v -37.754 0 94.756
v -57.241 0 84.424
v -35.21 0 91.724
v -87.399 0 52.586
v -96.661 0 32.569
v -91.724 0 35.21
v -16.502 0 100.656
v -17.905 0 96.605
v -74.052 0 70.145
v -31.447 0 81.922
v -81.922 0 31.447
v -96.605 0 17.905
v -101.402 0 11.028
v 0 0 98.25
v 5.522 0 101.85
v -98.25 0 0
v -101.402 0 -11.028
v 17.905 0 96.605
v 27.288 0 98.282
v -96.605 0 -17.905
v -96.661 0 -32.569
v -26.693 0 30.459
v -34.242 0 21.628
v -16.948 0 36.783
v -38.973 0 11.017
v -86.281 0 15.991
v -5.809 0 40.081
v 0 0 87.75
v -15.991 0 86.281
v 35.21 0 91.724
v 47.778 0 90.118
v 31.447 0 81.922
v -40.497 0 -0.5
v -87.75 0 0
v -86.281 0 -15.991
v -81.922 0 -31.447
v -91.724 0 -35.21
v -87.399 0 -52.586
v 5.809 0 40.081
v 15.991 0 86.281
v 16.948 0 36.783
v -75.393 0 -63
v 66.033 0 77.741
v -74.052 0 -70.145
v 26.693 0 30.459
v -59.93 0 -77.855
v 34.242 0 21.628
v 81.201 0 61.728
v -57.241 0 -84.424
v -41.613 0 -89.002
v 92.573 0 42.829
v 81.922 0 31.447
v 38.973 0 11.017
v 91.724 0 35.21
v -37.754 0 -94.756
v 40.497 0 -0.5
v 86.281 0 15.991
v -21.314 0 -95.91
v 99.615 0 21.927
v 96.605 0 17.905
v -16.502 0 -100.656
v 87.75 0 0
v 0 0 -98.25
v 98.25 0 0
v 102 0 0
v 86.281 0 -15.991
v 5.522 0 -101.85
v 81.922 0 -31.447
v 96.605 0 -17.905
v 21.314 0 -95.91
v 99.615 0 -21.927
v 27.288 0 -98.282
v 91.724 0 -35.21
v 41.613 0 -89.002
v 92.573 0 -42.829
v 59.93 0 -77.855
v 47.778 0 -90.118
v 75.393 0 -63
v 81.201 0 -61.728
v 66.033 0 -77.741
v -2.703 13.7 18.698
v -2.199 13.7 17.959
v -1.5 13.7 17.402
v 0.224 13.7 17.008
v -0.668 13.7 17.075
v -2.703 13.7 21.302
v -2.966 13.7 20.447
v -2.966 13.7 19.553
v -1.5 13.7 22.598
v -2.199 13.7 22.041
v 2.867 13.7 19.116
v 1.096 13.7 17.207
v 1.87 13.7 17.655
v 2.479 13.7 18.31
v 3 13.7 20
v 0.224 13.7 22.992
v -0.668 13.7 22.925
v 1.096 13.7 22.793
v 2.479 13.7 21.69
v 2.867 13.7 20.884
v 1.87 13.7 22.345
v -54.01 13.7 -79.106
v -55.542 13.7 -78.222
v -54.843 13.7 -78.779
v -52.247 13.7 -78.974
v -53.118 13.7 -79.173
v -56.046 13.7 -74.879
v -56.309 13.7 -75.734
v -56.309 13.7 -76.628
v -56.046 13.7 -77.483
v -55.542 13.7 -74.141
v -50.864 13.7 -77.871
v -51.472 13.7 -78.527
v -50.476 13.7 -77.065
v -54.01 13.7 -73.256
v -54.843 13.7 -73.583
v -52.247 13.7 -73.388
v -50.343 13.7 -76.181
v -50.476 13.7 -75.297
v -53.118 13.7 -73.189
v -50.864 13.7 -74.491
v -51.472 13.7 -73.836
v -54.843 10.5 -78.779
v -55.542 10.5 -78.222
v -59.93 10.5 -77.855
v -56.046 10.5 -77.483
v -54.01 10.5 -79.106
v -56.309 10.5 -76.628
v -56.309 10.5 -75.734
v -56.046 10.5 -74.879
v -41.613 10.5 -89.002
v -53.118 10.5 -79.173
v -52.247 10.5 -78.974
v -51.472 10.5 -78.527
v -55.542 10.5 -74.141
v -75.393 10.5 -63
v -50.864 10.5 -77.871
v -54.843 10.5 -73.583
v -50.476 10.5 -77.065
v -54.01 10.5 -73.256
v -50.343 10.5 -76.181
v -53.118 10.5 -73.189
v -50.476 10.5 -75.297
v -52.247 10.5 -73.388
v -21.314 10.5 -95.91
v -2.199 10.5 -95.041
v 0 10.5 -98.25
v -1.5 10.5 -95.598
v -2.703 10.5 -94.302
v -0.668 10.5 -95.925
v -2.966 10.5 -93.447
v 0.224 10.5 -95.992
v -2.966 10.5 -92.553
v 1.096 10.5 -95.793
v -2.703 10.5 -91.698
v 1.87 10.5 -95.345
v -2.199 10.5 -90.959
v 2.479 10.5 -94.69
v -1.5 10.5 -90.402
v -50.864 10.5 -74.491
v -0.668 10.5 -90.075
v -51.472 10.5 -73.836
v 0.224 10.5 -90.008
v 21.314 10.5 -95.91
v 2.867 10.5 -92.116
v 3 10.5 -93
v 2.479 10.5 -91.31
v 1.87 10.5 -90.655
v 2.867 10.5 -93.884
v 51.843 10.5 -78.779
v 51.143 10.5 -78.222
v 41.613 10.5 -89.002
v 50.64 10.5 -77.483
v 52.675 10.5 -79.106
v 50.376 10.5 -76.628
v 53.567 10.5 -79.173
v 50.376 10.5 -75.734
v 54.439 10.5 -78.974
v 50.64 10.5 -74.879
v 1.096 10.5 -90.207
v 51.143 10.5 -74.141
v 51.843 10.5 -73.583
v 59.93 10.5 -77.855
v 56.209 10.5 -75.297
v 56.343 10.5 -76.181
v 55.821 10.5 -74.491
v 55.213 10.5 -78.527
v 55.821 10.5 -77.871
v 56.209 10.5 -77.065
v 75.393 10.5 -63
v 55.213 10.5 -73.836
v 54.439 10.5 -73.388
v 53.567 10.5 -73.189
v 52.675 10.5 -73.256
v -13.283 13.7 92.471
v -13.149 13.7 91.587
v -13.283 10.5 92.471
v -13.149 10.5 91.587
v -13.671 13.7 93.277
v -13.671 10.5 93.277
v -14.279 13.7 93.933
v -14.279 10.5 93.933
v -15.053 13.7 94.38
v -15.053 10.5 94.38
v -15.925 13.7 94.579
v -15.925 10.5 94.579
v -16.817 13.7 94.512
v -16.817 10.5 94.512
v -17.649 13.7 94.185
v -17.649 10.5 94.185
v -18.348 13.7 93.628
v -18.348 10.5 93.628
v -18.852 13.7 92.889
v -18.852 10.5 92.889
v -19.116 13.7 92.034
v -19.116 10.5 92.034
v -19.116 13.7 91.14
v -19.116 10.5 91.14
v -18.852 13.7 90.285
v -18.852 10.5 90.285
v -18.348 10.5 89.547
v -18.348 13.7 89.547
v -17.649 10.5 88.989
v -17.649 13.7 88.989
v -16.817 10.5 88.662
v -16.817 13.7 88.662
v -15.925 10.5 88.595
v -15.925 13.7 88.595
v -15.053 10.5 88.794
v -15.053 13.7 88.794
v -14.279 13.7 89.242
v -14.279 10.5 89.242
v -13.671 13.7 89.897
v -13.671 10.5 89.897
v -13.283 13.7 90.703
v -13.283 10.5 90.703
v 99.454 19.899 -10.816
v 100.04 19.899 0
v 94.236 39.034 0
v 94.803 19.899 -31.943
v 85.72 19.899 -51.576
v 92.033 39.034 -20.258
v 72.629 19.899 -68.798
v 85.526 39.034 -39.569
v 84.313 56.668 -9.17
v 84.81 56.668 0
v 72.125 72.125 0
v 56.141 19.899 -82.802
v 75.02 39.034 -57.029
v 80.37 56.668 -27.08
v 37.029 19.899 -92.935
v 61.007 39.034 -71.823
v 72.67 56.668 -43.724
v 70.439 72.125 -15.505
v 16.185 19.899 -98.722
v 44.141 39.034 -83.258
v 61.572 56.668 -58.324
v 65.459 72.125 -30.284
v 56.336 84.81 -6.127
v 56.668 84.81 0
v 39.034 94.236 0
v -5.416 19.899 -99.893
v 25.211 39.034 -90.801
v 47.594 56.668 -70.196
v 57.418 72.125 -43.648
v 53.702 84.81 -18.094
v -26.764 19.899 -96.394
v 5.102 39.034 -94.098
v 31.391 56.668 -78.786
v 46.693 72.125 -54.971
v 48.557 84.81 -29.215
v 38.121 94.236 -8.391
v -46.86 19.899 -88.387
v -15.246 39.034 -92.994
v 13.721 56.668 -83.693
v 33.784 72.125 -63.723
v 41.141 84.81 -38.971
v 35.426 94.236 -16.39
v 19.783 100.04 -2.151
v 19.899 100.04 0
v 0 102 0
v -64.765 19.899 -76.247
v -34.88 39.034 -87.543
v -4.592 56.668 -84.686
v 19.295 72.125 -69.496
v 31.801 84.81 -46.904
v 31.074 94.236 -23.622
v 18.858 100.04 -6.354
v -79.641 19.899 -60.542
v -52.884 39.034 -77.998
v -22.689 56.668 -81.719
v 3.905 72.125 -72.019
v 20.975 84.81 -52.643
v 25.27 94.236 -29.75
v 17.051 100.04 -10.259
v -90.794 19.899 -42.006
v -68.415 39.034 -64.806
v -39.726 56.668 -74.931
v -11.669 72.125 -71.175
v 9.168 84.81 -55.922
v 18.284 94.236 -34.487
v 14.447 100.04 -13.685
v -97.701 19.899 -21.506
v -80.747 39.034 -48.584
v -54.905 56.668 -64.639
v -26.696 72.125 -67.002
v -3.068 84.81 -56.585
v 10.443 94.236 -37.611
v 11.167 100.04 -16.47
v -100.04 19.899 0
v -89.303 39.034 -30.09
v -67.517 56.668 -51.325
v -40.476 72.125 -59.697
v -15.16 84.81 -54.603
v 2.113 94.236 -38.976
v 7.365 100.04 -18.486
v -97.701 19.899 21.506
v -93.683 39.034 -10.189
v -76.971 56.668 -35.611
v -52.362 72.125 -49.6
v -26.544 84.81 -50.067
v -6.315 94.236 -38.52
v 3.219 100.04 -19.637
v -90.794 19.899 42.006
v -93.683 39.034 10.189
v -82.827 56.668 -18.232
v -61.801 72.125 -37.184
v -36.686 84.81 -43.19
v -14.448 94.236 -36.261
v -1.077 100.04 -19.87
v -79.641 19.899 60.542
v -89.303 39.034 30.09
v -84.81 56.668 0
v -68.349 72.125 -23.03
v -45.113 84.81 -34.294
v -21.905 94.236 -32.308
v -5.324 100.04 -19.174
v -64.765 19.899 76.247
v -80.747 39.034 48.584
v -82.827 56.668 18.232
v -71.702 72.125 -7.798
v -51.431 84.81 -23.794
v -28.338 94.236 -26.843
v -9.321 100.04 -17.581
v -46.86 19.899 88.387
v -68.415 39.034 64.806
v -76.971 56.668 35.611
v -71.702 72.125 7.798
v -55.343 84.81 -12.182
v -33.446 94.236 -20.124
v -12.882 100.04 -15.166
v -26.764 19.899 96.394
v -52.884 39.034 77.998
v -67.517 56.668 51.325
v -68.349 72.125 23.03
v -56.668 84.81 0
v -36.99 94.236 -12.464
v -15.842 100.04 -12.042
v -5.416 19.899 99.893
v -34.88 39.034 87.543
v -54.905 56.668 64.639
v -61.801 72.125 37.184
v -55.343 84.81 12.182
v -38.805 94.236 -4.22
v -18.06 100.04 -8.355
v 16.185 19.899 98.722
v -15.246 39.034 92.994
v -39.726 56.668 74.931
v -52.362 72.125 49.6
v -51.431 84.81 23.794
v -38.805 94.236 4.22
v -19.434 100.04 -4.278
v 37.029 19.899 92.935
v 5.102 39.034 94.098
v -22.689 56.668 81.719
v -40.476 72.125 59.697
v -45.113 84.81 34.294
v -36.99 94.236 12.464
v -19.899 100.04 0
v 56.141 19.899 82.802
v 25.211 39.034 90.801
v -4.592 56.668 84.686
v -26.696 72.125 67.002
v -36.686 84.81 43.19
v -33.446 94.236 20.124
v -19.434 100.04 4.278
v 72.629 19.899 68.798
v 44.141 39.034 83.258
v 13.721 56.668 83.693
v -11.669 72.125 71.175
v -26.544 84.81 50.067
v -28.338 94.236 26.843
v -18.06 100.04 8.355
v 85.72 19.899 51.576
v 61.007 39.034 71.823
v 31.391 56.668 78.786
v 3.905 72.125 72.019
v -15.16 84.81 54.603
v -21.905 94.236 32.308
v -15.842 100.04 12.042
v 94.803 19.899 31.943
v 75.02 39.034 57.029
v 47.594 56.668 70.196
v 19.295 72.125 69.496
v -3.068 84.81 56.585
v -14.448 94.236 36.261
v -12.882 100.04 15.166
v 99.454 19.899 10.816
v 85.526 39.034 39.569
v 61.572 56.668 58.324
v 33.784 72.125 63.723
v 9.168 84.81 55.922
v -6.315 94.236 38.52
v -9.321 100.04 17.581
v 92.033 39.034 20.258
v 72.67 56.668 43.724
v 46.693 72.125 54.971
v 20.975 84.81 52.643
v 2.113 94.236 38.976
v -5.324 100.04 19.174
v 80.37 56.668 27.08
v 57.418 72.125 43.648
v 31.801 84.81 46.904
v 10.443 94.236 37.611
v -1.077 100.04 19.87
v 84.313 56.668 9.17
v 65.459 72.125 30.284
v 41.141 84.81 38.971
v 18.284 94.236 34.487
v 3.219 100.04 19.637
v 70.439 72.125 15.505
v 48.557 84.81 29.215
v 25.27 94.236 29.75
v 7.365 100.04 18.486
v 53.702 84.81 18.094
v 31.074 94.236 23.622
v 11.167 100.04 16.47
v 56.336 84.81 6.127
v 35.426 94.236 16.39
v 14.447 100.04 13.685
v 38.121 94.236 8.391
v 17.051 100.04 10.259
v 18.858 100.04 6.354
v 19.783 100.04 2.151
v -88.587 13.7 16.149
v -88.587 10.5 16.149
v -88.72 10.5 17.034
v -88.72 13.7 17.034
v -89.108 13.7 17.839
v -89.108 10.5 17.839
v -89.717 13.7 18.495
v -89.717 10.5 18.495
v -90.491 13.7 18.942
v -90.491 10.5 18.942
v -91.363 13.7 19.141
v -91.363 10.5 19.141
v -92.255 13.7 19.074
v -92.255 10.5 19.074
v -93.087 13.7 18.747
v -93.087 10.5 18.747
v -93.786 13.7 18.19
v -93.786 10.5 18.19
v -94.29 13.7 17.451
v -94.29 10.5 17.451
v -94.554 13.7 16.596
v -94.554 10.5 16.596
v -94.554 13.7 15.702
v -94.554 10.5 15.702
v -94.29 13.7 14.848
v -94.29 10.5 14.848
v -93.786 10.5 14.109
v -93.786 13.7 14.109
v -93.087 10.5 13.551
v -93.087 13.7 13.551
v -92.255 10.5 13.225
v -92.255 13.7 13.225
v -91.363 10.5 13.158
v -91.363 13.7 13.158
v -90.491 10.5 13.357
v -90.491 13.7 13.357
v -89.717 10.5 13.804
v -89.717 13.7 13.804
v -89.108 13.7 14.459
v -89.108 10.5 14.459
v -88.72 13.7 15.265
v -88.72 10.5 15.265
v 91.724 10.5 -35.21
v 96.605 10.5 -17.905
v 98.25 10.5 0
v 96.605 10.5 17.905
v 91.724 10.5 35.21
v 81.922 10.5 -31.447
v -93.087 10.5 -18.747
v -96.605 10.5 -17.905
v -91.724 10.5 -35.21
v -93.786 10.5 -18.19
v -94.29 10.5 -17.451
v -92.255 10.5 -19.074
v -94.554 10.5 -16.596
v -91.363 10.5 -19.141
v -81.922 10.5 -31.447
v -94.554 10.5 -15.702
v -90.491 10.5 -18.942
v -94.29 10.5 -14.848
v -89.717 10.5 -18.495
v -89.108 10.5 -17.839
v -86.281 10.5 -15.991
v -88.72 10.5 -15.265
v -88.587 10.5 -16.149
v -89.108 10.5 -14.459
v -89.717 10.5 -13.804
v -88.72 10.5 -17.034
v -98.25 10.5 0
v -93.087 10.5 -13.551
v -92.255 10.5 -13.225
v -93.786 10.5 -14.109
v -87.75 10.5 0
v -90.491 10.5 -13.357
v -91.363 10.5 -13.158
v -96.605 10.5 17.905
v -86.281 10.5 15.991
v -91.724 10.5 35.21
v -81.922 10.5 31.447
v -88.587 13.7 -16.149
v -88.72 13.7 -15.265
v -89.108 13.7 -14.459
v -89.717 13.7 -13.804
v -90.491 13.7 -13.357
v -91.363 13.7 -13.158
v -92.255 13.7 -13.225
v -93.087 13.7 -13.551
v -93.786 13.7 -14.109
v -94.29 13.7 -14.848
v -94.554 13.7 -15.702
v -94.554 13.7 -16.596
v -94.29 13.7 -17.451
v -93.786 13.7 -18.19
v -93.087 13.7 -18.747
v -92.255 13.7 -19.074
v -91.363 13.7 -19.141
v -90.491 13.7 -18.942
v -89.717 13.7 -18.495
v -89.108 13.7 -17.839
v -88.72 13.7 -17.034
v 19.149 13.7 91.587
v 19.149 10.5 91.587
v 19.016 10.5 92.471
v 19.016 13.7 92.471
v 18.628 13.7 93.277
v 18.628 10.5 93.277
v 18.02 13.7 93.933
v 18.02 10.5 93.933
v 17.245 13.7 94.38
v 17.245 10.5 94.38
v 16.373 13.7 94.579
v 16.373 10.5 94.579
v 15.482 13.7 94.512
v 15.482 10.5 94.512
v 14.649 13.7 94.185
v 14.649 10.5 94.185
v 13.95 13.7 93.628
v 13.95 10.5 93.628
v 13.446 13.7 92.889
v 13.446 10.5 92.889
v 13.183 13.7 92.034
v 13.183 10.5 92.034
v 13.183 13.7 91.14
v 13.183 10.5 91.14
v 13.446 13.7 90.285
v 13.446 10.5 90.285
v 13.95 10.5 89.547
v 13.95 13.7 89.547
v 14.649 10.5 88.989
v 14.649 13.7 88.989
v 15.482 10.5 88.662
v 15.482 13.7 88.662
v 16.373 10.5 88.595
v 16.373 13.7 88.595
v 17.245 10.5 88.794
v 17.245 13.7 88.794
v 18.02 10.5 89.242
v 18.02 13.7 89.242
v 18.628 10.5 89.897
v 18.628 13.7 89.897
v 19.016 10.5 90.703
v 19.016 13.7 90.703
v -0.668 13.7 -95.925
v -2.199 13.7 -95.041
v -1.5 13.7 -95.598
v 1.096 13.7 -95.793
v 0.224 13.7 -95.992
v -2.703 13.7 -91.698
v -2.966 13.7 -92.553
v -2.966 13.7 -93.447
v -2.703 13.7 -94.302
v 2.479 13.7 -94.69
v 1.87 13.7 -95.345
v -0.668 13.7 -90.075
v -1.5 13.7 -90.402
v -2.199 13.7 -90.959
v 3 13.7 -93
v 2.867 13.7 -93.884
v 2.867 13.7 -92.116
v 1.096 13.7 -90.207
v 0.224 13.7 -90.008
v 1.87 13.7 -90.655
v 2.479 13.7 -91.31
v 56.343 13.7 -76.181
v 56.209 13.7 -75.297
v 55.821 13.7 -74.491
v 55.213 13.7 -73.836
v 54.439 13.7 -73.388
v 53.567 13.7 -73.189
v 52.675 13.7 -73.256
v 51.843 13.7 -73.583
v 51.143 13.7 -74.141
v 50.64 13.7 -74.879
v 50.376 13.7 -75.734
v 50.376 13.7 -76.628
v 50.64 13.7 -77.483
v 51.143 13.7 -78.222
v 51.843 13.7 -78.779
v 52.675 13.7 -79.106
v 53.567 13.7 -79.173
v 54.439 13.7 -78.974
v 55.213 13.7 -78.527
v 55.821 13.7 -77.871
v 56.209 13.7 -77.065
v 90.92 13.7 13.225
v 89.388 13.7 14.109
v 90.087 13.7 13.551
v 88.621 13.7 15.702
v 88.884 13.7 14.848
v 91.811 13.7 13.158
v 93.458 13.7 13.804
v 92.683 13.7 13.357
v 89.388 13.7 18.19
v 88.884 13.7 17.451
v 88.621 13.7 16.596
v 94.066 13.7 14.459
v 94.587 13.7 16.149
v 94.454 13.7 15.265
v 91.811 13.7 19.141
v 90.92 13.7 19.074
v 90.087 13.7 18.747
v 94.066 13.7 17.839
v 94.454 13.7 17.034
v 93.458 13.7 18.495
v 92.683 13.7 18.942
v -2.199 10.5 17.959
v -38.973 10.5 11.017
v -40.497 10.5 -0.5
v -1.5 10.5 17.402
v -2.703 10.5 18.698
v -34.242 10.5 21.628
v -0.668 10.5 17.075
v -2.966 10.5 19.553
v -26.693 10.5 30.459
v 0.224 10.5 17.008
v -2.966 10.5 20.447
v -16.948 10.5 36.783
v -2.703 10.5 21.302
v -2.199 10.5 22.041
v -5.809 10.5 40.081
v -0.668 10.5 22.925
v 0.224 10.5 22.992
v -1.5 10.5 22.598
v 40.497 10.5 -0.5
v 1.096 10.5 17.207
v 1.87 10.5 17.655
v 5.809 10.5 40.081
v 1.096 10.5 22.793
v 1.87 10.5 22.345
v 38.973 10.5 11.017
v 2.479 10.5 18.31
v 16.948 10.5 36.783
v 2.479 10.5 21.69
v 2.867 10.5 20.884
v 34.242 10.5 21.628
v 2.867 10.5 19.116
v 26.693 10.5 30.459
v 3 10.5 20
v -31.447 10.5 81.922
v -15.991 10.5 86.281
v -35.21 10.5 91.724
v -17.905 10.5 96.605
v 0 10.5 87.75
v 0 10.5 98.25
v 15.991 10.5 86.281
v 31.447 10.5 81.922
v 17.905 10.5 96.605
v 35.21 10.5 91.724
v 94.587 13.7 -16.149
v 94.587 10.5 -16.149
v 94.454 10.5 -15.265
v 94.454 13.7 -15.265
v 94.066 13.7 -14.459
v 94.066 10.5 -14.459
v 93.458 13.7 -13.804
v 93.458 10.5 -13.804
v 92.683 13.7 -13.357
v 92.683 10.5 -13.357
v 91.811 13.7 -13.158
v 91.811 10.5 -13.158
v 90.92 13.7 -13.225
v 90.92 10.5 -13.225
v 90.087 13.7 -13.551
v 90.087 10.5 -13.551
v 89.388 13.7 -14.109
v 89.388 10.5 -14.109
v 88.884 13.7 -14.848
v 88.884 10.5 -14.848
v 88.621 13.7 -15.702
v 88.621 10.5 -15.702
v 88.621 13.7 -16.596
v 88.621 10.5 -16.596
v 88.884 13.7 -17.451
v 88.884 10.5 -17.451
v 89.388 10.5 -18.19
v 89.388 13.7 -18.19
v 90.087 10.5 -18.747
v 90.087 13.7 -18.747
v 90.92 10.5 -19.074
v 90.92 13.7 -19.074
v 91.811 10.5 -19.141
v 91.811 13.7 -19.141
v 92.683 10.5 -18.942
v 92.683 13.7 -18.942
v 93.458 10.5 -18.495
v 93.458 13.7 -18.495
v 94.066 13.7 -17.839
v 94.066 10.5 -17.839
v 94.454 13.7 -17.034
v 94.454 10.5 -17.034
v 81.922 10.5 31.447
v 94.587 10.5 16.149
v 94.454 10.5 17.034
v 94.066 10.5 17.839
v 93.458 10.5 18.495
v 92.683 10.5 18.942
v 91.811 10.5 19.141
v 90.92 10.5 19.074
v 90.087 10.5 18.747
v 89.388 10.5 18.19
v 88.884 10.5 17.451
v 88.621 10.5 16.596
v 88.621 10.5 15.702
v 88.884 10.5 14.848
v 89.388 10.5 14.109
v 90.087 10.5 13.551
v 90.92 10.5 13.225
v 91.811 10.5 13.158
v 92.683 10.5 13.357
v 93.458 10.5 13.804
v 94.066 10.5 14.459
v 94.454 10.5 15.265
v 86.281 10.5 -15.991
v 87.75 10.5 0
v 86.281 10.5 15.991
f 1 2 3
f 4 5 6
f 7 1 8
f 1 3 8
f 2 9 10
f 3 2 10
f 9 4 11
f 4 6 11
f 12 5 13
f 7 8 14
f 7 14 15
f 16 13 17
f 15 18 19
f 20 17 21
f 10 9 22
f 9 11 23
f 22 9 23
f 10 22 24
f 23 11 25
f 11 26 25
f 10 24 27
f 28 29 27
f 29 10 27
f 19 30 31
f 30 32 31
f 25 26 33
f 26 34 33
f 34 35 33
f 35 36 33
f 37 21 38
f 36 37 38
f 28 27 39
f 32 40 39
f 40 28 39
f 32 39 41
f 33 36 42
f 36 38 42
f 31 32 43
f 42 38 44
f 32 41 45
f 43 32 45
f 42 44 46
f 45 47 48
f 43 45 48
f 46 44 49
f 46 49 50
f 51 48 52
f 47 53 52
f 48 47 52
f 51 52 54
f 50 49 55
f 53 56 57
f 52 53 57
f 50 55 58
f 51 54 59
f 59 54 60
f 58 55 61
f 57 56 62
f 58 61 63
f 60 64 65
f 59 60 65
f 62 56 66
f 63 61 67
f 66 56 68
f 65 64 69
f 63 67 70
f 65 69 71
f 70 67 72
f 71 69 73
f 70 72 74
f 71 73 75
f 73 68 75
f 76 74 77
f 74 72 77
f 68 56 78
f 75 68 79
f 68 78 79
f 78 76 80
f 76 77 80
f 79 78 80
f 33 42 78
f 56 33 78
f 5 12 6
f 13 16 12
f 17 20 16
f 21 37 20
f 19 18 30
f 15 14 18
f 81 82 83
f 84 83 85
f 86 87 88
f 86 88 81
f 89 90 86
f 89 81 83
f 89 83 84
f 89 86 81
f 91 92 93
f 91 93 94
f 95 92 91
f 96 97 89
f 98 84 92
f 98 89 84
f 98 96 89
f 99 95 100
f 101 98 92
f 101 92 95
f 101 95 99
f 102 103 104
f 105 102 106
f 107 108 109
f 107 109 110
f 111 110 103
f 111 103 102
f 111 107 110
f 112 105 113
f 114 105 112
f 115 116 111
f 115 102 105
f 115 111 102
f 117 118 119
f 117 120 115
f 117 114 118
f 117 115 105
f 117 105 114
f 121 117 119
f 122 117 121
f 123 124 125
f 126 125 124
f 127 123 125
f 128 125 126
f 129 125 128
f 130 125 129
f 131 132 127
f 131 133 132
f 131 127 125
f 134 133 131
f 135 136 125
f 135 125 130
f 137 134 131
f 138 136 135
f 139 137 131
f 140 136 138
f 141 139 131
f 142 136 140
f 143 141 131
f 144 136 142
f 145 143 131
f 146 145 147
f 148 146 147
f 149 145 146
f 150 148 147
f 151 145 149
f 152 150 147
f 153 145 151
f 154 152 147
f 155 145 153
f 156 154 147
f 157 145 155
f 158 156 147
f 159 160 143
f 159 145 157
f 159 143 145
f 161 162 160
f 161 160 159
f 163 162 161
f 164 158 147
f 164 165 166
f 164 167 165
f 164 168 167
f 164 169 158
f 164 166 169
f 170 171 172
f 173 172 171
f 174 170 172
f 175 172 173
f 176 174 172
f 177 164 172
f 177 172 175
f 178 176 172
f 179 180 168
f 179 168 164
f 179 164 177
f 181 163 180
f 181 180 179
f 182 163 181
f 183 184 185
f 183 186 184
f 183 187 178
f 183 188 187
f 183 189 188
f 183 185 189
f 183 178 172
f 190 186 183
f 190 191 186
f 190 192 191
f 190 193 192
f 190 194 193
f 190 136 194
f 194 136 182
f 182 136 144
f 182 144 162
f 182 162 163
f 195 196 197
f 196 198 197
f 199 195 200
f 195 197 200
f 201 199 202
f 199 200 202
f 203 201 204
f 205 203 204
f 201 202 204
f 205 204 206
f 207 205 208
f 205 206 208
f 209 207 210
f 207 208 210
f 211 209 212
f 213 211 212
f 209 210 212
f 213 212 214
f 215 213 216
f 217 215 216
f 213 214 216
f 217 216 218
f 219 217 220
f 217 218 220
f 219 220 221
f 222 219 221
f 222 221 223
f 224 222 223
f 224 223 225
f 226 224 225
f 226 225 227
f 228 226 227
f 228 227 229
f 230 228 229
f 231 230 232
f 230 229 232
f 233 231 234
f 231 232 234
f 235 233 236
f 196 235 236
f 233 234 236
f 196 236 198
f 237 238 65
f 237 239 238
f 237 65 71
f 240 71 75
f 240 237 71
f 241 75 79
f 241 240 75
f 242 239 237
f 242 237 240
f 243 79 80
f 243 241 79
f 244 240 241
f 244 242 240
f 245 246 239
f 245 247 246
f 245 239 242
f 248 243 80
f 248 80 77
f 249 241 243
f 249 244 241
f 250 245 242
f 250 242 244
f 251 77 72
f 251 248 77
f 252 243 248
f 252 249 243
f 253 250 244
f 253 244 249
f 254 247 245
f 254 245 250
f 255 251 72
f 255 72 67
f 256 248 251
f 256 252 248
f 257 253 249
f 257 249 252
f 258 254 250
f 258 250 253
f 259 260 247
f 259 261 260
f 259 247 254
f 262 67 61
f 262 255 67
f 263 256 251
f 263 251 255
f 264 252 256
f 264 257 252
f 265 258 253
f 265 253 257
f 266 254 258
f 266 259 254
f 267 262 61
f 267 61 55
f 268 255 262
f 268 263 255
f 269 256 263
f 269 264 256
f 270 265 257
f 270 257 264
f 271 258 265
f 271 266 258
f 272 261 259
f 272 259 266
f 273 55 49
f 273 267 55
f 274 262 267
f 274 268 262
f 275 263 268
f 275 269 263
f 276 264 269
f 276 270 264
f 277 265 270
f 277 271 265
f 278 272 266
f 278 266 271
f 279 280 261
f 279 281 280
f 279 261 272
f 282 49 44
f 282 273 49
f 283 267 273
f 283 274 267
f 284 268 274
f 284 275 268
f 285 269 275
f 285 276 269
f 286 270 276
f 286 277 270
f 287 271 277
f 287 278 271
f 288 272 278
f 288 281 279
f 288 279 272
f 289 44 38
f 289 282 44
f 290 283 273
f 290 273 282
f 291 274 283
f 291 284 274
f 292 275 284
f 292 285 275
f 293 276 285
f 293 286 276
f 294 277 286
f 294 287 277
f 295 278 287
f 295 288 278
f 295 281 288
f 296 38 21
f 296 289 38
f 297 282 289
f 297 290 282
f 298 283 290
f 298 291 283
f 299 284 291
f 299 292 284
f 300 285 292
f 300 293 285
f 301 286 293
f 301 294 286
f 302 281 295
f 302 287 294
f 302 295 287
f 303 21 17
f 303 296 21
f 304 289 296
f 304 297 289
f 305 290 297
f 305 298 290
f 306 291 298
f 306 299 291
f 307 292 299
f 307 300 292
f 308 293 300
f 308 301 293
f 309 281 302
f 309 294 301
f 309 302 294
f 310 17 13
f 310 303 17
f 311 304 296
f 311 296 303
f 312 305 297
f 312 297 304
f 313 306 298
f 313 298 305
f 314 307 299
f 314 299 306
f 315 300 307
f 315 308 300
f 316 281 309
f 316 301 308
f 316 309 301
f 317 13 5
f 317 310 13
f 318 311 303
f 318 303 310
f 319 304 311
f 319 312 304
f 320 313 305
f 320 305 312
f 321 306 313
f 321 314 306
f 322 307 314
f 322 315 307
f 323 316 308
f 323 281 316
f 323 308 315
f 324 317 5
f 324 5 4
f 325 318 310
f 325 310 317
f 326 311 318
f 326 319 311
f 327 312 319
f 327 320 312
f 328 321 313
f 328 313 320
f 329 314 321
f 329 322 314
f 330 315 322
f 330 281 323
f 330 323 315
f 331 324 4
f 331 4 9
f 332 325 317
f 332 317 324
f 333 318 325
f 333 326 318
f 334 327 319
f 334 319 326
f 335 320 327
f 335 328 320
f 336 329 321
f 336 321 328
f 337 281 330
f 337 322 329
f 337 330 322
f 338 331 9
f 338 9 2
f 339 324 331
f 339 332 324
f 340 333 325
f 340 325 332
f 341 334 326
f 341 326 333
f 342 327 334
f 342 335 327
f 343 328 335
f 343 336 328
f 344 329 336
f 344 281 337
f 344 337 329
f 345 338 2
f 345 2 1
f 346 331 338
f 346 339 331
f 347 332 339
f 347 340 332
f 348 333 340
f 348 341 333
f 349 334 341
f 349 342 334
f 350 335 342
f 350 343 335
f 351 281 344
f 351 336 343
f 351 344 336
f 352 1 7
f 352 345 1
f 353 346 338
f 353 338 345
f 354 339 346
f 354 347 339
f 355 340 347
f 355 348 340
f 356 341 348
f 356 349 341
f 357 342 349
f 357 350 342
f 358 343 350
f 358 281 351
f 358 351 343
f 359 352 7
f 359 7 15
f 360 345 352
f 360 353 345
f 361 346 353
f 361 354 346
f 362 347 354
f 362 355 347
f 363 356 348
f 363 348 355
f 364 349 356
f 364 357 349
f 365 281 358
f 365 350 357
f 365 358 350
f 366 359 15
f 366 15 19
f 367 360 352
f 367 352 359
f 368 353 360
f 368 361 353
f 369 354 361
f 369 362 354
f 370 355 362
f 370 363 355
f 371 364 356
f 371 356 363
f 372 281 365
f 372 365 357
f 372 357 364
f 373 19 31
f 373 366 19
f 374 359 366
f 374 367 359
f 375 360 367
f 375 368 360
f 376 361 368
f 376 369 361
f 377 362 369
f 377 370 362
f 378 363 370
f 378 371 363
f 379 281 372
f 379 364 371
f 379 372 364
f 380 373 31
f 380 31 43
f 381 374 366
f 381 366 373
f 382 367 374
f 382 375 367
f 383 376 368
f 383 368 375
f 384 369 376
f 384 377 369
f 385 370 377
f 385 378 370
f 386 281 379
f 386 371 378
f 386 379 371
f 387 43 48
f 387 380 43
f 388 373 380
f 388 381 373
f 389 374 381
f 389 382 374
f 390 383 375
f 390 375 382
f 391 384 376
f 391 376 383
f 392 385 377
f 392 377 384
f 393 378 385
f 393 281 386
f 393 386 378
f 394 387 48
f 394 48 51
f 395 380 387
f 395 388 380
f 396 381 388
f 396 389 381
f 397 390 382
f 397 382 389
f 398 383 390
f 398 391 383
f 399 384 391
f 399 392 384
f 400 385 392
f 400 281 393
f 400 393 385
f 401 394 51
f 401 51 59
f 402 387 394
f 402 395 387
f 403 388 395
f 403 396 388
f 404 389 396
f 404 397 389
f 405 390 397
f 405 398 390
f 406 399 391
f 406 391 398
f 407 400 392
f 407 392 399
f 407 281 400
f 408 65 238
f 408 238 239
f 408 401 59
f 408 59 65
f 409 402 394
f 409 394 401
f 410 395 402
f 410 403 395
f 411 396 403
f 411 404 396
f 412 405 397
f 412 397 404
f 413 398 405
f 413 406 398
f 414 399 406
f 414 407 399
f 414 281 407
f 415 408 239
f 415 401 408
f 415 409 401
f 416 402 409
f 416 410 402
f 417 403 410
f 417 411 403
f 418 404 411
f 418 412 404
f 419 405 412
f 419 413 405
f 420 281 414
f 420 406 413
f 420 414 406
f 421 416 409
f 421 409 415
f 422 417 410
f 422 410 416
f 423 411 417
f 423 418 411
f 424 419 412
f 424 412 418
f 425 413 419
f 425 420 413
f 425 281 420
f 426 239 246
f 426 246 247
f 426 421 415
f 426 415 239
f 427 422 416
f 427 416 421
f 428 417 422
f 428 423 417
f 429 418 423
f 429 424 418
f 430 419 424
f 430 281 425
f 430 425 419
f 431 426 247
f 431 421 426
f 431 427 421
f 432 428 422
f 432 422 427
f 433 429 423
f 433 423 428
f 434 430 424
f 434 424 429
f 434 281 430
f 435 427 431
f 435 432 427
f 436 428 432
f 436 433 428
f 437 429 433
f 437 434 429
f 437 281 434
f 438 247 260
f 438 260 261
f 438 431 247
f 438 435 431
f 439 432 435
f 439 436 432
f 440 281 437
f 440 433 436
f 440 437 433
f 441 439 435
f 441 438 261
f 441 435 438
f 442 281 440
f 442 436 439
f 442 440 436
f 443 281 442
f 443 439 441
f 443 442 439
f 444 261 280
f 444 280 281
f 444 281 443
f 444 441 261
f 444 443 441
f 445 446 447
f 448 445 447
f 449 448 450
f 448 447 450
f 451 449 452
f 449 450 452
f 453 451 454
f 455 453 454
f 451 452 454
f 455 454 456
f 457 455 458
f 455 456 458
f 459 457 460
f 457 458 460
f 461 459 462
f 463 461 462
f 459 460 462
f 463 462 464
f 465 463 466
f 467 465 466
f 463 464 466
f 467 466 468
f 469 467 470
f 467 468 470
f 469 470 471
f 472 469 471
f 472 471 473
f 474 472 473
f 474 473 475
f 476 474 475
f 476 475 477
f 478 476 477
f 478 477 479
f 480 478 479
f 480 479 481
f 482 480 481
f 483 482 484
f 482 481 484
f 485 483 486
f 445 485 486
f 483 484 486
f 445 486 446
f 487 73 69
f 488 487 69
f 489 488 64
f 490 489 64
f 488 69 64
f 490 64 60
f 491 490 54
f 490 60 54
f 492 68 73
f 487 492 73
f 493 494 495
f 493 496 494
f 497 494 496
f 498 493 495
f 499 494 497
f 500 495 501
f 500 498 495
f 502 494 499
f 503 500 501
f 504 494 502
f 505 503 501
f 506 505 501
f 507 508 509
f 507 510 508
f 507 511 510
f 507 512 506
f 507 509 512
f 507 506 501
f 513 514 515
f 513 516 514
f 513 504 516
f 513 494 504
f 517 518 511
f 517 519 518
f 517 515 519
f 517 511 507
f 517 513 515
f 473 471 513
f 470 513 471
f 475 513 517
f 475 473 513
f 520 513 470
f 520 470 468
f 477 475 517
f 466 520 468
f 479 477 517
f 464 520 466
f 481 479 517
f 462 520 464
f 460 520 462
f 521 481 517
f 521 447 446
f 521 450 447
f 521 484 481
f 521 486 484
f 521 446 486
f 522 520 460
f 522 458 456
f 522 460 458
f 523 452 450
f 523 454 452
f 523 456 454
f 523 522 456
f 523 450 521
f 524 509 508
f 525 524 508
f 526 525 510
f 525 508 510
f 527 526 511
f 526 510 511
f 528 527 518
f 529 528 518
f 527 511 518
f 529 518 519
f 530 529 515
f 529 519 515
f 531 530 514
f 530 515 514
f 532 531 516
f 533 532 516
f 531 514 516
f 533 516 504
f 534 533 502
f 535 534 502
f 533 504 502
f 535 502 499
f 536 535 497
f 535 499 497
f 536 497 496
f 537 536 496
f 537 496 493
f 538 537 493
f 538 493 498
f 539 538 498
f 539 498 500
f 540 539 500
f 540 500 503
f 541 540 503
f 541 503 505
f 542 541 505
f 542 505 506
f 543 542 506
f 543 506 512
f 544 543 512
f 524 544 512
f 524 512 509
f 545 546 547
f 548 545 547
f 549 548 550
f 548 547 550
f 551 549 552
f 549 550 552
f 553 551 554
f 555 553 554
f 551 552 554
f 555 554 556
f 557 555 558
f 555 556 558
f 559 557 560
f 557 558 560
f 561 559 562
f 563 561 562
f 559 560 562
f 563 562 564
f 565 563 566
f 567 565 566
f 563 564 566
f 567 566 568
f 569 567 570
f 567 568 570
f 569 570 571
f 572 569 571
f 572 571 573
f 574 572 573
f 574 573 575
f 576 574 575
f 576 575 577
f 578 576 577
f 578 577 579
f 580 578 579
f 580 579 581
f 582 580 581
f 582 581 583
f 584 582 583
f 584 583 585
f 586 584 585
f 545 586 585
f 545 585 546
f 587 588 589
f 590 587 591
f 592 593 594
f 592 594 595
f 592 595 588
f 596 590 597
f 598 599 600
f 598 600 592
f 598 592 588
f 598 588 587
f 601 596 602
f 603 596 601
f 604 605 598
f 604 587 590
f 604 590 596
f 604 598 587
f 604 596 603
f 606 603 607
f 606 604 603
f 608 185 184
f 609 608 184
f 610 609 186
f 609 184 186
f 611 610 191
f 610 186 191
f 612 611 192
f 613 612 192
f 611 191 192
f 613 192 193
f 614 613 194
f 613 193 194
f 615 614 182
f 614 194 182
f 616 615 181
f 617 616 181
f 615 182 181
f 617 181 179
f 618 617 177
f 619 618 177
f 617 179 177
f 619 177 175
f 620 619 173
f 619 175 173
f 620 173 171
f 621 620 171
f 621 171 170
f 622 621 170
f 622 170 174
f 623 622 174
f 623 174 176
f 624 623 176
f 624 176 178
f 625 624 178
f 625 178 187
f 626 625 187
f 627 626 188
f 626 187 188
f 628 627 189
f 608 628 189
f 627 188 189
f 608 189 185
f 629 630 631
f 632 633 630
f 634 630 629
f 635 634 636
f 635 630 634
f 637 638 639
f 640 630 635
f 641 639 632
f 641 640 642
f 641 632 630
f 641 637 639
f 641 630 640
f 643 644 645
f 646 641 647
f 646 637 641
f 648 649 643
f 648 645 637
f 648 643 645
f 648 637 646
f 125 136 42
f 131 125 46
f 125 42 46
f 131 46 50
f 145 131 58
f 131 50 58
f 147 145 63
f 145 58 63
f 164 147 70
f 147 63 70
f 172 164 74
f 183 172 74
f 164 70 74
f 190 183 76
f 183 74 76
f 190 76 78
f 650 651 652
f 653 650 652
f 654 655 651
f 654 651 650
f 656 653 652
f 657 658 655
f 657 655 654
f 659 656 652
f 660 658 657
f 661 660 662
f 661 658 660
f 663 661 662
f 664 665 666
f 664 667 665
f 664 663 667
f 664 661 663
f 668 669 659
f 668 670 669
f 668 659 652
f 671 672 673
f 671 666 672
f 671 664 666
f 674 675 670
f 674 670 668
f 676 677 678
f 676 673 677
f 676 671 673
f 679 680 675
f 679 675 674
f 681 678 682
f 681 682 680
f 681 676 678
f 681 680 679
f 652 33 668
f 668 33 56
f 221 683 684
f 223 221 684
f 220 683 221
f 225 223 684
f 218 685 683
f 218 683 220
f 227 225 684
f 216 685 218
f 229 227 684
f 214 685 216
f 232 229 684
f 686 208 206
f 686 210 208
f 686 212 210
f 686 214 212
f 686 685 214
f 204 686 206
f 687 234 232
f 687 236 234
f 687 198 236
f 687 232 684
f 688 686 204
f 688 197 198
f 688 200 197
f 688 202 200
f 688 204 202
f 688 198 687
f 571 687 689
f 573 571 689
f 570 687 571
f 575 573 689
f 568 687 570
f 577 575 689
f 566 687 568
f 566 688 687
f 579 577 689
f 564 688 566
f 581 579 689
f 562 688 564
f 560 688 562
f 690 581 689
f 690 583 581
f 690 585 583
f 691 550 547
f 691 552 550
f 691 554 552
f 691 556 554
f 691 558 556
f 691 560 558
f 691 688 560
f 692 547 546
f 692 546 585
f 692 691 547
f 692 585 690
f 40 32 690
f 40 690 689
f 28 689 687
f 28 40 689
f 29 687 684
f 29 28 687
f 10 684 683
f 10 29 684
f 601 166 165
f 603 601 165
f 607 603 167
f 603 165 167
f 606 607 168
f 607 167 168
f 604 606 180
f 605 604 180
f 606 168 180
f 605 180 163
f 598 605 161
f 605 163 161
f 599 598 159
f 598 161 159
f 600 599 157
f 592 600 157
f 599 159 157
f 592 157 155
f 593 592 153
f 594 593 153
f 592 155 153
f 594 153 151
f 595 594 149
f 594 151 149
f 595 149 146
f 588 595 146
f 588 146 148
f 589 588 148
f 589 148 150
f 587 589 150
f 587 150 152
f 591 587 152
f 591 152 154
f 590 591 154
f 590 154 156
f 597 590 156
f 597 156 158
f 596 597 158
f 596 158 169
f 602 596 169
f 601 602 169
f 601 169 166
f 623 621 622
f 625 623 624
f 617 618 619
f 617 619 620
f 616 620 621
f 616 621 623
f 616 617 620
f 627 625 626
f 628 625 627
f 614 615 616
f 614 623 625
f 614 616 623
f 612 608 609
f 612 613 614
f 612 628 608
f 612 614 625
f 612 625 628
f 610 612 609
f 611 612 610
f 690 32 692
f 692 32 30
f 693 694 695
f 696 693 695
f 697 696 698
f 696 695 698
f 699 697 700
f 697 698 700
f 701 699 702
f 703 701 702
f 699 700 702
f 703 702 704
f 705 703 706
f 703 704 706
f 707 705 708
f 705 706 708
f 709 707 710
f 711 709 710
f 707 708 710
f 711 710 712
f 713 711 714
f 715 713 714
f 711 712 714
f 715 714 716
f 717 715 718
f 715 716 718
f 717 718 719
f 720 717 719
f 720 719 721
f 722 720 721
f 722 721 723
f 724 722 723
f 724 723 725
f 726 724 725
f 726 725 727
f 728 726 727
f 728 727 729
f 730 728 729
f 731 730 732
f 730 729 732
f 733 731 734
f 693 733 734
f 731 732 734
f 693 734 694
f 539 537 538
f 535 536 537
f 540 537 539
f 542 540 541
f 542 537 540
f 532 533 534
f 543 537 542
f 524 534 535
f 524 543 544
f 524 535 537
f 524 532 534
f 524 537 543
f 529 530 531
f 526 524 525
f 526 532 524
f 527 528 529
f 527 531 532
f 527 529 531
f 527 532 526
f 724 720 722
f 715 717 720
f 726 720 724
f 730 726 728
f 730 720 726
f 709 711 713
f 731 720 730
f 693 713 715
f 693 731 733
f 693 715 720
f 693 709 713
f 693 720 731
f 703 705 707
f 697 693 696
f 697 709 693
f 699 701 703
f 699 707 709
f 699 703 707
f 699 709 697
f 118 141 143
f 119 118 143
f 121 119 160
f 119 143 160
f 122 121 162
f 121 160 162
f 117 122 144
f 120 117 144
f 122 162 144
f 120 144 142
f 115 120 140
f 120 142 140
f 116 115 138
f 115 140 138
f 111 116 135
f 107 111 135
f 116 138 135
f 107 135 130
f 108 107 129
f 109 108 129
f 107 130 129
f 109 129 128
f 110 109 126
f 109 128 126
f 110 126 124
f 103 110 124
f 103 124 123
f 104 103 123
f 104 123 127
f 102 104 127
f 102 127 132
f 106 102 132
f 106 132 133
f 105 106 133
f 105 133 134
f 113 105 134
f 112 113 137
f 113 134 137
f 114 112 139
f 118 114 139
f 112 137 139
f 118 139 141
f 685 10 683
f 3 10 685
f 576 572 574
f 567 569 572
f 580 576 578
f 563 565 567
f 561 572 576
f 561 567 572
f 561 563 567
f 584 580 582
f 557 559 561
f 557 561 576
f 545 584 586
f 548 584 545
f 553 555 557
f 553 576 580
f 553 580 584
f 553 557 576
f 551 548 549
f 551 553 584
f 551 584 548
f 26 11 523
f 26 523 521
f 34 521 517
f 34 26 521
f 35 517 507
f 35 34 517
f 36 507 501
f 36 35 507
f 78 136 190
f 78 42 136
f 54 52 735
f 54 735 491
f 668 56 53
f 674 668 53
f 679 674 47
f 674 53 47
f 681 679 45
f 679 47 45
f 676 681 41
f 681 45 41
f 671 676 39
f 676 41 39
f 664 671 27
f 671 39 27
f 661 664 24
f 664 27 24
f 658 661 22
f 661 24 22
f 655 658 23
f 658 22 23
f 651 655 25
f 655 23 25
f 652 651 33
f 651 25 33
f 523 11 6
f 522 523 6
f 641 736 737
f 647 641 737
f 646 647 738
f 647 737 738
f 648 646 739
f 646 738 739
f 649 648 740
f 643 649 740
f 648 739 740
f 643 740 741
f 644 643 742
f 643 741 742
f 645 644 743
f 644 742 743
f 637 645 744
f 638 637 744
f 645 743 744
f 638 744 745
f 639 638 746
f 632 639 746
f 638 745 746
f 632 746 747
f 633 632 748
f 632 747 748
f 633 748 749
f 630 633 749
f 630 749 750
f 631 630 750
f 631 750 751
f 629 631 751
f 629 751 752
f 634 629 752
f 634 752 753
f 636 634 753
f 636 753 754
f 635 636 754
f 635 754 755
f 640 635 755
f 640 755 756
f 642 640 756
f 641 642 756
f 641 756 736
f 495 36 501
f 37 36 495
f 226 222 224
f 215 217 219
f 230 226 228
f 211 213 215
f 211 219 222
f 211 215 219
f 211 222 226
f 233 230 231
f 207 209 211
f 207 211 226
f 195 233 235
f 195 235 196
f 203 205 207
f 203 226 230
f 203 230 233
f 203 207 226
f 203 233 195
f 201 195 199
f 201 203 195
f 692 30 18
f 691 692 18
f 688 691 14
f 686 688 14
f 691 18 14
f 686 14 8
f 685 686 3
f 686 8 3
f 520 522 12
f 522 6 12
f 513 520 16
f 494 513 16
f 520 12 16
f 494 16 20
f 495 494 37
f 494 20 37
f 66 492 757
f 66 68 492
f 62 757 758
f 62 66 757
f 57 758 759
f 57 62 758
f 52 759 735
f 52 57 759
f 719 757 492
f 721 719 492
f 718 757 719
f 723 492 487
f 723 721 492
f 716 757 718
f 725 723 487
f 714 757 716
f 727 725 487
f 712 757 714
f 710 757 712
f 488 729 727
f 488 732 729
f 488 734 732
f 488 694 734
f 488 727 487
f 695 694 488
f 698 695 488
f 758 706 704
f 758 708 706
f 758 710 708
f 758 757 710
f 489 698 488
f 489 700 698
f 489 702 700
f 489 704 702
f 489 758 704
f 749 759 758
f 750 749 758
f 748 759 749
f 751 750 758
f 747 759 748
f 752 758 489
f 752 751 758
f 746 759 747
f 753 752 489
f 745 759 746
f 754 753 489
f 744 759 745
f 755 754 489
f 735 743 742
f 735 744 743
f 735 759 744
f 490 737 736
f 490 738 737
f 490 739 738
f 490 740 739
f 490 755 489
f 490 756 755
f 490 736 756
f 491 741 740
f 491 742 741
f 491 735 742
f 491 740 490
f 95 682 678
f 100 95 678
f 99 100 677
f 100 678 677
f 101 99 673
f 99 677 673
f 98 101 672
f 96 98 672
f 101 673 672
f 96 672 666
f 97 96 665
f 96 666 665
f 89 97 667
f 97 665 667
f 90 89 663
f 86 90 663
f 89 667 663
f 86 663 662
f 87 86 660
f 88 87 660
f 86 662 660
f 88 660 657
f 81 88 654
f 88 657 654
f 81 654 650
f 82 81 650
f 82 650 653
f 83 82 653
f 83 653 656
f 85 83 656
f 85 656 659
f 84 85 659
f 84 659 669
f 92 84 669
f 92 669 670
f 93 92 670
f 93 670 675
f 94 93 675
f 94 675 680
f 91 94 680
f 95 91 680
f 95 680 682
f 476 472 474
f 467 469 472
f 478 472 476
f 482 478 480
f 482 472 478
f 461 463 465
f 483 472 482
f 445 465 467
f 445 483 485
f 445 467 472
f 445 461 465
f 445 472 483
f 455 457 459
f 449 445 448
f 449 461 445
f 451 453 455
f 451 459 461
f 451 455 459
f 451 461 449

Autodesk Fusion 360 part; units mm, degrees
sketch "Sketch1" plane through (0, 0, 0) normal (0, 0, 1) x (1, 0, 0)
  line L0 (0, 0) -> (102, 0)
  line L1 (0, 0) -> (0, 102)
  arc A0 (102, 0) -> (0, 102) centre (0, 0) ccw
  dimension "d1" = 204
revolve "Revolve1" add sketch "Sketch1" angle 360 about axis through (0, 0, 0) along (0, 1, 0)
sketch "Sketch2" plane through (0, 0, 0) normal (0, -1, 0) x (1, 0, 0)
  circle A0 centre (0, 0) radius 102
  line L0 (0, 0) -> (0, -0.5) construction
  line L1 (0, -0.5) -> (-40.4969, -0.5) construction
  line L2 (-40.4969, -0.5) -> (40.4969, -0.5)
  arc A1 (40.4969, -0.5) -> (-40.4969, -0.5) centre (0, 0) ccw
  dimension "d3" = 81
  dimension "d4" = 0.5
extrude "Extrude1" cut sketch "Sketch2" against normal blind 10.5 contours L2 A1
sketch "Sketch3" plane through (0, 0, 0) normal (0, -1, 0) x (1, 0, 0)
  line L0 (40.4969, -0.5) -> (-40.4969, -0.5)
  arc A0 (40.4969, -0.5) -> (-40.4969, -0.5) centre (0, 0) ccw
  circle A1 centre (0, 0) radius 102
sketch "Sketch4" plane through (0, 0, 0) normal (0, -1, 0) x (1, 0, 0)
  line L0 (0, 0) -> (0, -64) construction
  line L1 (40, -64) -> (40, -63)
  line L2 (40, -46.5) -> (-40, -81.5) construction
  line L3 (-40, -46.5) -> (0, -64) construction
  line L4 (0, -64) -> (0, -63)
  line L5 (0, -63) -> (-61.0824, -63)
  line L6 (0, -63) -> (61.0824, -63)
  line L7 (-40, -63) -> (-40, -64)
  arc A0 (-36.3095, -79.8854) -> (-32.524, -81.5) centre (0, 0) ccw
  line L8 (31.4468, 81.9217) -> (35.2097, 91.7243)
  line L9 (0, 0) -> (98.25, 0) construction
  line L10 (-31.4468, 81.9217) -> (-35.2097, 91.7243)
  line L11 (0, 0) -> (98.25, 0) construction
  line L12 (81.9217, 31.4468) -> (91.7243, 35.2097)
  line L13 (0, 0) -> (98.25, 0) construction
  line L14 (81.9217, -31.4468) -> (91.7243, -35.2097)
  line L15 (0, 0) -> (98.25, 0) construction
  line L16 (0, 114.2451) -> (0, -120) construction
  line L17 (-81.9217, 31.4468) -> (-91.7243, 35.2097)
  line L18 (-81.9217, -31.4468) -> (-91.7243, -35.2097)
  arc A1 (-81.9217, 31.4468) -> (-81.9217, -31.4468) centre (0, 0) ccw
  arc A2 (81.9217, -31.4468) -> (81.9217, 31.4468) centre (0, 0) ccw
  arc A3 (31.4468, 81.9217) -> (-31.4468, 81.9217) centre (0, 0) ccw
  arc A4 (35.2097, 91.7243) -> (-35.2097, 91.7243) centre (0, 0) ccw
  line L19 (-61.0824, -63) -> (-75.3927, -63)
  line L20 (61.0824, -63) -> (75.3927, -63)
  arc A5 (-91.7243, 35.2097) -> (-91.7243, -35.2097) centre (0, 0) ccw
  arc A6 (-75.3927, -63) -> (75.3927, -63) centre (0, 0) ccw
  arc A7 (91.7243, -35.2097) -> (91.7243, 35.2097) centre (0, 0) ccw
  point P0 (0, -64)
  dimension "d9" = 196.5
  dimension "d10" = 175.5
  dimension "d11" = 64
  dimension "d13" = 35
  dimension "d14" = 1
  dimension "d15" = 69
  dimension "d16" = 111
  dimension "d17" = 21
  dimension "d18" = 21
extrude "Extrude2" cut sketch "Sketch4" against normal blind 10.5
sketch "Sketch5" plane through (0, 0, 0) normal (0, -1, 0) x (1, 0, 0)
  circle A0 centre (0, 0) radius 93 construction
  line L0 (0, 0) -> (-16.1493, 91.5871) construction
  line L1 (0, 0) -> (93, 0) construction
  line L2 (0, 0) -> (16.1493, 91.5871) construction
  line L3 (0, 0) -> (93, 0) construction
  line L4 (0, 0) -> (-91.5871, 16.1493) construction
  line L5 (0, 0) -> (93, 0) construction
  line L6 (0, 0) -> (-91.5871, -16.1493) construction
  line L7 (0, 0) -> (93, 0) construction
  line L8 (0, 0) -> (91.5871, 16.1493) construction
  line L9 (0, 0) -> (93, 0) construction
  line L10 (0, 0) -> (91.5871, -16.1493) construction
  line L11 (0, 0) -> (93, 0) construction
  line L12 (0, 0) -> (0, -93) construction
  line L13 (0, 0) -> (-53.3426, -76.1811) construction
  line L14 (0, 0) -> (93, 0) construction
  line L15 (0, 0) -> (53.3426, -76.1811) construction
  circle A1 centre (0, 0) radius 20 construction
  line L16 (0, 0) -> (0, 20) construction
  circle A2 centre (-16.1493, 91.5871) radius 3
  circle A3 centre (16.1493, 91.5871) radius 3
  line L17 (0, 130) -> (0, -112.7435) construction
  circle A4 centre (-91.5871, 16.1493) radius 3
  circle A5 centre (-91.5871, -16.1493) radius 3
  circle A6 centre (-53.3426, -76.1811) radius 3
  circle A7 centre (91.5871, 16.1493) radius 3
  circle A8 centre (91.5871, -16.1493) radius 3
  circle A9 centre (53.3426, -76.1811) radius 3
  circle A10 centre (0, 20) radius 3
  circle A11 centre (0, -93) radius 3
  dimension "d21" = 186
  dimension "d22" = 100
  dimension "d23" = 80
  dimension "d24" = 170
  dimension "d25" = 170
  dimension "d26" = 10
  dimension "d27" = 10
  dimension "d28" = 125
  dimension "d29" = 40
  dimension "d30" = 6
  dimension "d31" = 6
  dimension "d32" = 6
  dimension "d33" = 6
  dimension "d34" = 6
  dimension "d35" = 6
  dimension "d36" = 6
extrude "Extrude3" cut sketch "Sketch5" against normal blind 13.7
